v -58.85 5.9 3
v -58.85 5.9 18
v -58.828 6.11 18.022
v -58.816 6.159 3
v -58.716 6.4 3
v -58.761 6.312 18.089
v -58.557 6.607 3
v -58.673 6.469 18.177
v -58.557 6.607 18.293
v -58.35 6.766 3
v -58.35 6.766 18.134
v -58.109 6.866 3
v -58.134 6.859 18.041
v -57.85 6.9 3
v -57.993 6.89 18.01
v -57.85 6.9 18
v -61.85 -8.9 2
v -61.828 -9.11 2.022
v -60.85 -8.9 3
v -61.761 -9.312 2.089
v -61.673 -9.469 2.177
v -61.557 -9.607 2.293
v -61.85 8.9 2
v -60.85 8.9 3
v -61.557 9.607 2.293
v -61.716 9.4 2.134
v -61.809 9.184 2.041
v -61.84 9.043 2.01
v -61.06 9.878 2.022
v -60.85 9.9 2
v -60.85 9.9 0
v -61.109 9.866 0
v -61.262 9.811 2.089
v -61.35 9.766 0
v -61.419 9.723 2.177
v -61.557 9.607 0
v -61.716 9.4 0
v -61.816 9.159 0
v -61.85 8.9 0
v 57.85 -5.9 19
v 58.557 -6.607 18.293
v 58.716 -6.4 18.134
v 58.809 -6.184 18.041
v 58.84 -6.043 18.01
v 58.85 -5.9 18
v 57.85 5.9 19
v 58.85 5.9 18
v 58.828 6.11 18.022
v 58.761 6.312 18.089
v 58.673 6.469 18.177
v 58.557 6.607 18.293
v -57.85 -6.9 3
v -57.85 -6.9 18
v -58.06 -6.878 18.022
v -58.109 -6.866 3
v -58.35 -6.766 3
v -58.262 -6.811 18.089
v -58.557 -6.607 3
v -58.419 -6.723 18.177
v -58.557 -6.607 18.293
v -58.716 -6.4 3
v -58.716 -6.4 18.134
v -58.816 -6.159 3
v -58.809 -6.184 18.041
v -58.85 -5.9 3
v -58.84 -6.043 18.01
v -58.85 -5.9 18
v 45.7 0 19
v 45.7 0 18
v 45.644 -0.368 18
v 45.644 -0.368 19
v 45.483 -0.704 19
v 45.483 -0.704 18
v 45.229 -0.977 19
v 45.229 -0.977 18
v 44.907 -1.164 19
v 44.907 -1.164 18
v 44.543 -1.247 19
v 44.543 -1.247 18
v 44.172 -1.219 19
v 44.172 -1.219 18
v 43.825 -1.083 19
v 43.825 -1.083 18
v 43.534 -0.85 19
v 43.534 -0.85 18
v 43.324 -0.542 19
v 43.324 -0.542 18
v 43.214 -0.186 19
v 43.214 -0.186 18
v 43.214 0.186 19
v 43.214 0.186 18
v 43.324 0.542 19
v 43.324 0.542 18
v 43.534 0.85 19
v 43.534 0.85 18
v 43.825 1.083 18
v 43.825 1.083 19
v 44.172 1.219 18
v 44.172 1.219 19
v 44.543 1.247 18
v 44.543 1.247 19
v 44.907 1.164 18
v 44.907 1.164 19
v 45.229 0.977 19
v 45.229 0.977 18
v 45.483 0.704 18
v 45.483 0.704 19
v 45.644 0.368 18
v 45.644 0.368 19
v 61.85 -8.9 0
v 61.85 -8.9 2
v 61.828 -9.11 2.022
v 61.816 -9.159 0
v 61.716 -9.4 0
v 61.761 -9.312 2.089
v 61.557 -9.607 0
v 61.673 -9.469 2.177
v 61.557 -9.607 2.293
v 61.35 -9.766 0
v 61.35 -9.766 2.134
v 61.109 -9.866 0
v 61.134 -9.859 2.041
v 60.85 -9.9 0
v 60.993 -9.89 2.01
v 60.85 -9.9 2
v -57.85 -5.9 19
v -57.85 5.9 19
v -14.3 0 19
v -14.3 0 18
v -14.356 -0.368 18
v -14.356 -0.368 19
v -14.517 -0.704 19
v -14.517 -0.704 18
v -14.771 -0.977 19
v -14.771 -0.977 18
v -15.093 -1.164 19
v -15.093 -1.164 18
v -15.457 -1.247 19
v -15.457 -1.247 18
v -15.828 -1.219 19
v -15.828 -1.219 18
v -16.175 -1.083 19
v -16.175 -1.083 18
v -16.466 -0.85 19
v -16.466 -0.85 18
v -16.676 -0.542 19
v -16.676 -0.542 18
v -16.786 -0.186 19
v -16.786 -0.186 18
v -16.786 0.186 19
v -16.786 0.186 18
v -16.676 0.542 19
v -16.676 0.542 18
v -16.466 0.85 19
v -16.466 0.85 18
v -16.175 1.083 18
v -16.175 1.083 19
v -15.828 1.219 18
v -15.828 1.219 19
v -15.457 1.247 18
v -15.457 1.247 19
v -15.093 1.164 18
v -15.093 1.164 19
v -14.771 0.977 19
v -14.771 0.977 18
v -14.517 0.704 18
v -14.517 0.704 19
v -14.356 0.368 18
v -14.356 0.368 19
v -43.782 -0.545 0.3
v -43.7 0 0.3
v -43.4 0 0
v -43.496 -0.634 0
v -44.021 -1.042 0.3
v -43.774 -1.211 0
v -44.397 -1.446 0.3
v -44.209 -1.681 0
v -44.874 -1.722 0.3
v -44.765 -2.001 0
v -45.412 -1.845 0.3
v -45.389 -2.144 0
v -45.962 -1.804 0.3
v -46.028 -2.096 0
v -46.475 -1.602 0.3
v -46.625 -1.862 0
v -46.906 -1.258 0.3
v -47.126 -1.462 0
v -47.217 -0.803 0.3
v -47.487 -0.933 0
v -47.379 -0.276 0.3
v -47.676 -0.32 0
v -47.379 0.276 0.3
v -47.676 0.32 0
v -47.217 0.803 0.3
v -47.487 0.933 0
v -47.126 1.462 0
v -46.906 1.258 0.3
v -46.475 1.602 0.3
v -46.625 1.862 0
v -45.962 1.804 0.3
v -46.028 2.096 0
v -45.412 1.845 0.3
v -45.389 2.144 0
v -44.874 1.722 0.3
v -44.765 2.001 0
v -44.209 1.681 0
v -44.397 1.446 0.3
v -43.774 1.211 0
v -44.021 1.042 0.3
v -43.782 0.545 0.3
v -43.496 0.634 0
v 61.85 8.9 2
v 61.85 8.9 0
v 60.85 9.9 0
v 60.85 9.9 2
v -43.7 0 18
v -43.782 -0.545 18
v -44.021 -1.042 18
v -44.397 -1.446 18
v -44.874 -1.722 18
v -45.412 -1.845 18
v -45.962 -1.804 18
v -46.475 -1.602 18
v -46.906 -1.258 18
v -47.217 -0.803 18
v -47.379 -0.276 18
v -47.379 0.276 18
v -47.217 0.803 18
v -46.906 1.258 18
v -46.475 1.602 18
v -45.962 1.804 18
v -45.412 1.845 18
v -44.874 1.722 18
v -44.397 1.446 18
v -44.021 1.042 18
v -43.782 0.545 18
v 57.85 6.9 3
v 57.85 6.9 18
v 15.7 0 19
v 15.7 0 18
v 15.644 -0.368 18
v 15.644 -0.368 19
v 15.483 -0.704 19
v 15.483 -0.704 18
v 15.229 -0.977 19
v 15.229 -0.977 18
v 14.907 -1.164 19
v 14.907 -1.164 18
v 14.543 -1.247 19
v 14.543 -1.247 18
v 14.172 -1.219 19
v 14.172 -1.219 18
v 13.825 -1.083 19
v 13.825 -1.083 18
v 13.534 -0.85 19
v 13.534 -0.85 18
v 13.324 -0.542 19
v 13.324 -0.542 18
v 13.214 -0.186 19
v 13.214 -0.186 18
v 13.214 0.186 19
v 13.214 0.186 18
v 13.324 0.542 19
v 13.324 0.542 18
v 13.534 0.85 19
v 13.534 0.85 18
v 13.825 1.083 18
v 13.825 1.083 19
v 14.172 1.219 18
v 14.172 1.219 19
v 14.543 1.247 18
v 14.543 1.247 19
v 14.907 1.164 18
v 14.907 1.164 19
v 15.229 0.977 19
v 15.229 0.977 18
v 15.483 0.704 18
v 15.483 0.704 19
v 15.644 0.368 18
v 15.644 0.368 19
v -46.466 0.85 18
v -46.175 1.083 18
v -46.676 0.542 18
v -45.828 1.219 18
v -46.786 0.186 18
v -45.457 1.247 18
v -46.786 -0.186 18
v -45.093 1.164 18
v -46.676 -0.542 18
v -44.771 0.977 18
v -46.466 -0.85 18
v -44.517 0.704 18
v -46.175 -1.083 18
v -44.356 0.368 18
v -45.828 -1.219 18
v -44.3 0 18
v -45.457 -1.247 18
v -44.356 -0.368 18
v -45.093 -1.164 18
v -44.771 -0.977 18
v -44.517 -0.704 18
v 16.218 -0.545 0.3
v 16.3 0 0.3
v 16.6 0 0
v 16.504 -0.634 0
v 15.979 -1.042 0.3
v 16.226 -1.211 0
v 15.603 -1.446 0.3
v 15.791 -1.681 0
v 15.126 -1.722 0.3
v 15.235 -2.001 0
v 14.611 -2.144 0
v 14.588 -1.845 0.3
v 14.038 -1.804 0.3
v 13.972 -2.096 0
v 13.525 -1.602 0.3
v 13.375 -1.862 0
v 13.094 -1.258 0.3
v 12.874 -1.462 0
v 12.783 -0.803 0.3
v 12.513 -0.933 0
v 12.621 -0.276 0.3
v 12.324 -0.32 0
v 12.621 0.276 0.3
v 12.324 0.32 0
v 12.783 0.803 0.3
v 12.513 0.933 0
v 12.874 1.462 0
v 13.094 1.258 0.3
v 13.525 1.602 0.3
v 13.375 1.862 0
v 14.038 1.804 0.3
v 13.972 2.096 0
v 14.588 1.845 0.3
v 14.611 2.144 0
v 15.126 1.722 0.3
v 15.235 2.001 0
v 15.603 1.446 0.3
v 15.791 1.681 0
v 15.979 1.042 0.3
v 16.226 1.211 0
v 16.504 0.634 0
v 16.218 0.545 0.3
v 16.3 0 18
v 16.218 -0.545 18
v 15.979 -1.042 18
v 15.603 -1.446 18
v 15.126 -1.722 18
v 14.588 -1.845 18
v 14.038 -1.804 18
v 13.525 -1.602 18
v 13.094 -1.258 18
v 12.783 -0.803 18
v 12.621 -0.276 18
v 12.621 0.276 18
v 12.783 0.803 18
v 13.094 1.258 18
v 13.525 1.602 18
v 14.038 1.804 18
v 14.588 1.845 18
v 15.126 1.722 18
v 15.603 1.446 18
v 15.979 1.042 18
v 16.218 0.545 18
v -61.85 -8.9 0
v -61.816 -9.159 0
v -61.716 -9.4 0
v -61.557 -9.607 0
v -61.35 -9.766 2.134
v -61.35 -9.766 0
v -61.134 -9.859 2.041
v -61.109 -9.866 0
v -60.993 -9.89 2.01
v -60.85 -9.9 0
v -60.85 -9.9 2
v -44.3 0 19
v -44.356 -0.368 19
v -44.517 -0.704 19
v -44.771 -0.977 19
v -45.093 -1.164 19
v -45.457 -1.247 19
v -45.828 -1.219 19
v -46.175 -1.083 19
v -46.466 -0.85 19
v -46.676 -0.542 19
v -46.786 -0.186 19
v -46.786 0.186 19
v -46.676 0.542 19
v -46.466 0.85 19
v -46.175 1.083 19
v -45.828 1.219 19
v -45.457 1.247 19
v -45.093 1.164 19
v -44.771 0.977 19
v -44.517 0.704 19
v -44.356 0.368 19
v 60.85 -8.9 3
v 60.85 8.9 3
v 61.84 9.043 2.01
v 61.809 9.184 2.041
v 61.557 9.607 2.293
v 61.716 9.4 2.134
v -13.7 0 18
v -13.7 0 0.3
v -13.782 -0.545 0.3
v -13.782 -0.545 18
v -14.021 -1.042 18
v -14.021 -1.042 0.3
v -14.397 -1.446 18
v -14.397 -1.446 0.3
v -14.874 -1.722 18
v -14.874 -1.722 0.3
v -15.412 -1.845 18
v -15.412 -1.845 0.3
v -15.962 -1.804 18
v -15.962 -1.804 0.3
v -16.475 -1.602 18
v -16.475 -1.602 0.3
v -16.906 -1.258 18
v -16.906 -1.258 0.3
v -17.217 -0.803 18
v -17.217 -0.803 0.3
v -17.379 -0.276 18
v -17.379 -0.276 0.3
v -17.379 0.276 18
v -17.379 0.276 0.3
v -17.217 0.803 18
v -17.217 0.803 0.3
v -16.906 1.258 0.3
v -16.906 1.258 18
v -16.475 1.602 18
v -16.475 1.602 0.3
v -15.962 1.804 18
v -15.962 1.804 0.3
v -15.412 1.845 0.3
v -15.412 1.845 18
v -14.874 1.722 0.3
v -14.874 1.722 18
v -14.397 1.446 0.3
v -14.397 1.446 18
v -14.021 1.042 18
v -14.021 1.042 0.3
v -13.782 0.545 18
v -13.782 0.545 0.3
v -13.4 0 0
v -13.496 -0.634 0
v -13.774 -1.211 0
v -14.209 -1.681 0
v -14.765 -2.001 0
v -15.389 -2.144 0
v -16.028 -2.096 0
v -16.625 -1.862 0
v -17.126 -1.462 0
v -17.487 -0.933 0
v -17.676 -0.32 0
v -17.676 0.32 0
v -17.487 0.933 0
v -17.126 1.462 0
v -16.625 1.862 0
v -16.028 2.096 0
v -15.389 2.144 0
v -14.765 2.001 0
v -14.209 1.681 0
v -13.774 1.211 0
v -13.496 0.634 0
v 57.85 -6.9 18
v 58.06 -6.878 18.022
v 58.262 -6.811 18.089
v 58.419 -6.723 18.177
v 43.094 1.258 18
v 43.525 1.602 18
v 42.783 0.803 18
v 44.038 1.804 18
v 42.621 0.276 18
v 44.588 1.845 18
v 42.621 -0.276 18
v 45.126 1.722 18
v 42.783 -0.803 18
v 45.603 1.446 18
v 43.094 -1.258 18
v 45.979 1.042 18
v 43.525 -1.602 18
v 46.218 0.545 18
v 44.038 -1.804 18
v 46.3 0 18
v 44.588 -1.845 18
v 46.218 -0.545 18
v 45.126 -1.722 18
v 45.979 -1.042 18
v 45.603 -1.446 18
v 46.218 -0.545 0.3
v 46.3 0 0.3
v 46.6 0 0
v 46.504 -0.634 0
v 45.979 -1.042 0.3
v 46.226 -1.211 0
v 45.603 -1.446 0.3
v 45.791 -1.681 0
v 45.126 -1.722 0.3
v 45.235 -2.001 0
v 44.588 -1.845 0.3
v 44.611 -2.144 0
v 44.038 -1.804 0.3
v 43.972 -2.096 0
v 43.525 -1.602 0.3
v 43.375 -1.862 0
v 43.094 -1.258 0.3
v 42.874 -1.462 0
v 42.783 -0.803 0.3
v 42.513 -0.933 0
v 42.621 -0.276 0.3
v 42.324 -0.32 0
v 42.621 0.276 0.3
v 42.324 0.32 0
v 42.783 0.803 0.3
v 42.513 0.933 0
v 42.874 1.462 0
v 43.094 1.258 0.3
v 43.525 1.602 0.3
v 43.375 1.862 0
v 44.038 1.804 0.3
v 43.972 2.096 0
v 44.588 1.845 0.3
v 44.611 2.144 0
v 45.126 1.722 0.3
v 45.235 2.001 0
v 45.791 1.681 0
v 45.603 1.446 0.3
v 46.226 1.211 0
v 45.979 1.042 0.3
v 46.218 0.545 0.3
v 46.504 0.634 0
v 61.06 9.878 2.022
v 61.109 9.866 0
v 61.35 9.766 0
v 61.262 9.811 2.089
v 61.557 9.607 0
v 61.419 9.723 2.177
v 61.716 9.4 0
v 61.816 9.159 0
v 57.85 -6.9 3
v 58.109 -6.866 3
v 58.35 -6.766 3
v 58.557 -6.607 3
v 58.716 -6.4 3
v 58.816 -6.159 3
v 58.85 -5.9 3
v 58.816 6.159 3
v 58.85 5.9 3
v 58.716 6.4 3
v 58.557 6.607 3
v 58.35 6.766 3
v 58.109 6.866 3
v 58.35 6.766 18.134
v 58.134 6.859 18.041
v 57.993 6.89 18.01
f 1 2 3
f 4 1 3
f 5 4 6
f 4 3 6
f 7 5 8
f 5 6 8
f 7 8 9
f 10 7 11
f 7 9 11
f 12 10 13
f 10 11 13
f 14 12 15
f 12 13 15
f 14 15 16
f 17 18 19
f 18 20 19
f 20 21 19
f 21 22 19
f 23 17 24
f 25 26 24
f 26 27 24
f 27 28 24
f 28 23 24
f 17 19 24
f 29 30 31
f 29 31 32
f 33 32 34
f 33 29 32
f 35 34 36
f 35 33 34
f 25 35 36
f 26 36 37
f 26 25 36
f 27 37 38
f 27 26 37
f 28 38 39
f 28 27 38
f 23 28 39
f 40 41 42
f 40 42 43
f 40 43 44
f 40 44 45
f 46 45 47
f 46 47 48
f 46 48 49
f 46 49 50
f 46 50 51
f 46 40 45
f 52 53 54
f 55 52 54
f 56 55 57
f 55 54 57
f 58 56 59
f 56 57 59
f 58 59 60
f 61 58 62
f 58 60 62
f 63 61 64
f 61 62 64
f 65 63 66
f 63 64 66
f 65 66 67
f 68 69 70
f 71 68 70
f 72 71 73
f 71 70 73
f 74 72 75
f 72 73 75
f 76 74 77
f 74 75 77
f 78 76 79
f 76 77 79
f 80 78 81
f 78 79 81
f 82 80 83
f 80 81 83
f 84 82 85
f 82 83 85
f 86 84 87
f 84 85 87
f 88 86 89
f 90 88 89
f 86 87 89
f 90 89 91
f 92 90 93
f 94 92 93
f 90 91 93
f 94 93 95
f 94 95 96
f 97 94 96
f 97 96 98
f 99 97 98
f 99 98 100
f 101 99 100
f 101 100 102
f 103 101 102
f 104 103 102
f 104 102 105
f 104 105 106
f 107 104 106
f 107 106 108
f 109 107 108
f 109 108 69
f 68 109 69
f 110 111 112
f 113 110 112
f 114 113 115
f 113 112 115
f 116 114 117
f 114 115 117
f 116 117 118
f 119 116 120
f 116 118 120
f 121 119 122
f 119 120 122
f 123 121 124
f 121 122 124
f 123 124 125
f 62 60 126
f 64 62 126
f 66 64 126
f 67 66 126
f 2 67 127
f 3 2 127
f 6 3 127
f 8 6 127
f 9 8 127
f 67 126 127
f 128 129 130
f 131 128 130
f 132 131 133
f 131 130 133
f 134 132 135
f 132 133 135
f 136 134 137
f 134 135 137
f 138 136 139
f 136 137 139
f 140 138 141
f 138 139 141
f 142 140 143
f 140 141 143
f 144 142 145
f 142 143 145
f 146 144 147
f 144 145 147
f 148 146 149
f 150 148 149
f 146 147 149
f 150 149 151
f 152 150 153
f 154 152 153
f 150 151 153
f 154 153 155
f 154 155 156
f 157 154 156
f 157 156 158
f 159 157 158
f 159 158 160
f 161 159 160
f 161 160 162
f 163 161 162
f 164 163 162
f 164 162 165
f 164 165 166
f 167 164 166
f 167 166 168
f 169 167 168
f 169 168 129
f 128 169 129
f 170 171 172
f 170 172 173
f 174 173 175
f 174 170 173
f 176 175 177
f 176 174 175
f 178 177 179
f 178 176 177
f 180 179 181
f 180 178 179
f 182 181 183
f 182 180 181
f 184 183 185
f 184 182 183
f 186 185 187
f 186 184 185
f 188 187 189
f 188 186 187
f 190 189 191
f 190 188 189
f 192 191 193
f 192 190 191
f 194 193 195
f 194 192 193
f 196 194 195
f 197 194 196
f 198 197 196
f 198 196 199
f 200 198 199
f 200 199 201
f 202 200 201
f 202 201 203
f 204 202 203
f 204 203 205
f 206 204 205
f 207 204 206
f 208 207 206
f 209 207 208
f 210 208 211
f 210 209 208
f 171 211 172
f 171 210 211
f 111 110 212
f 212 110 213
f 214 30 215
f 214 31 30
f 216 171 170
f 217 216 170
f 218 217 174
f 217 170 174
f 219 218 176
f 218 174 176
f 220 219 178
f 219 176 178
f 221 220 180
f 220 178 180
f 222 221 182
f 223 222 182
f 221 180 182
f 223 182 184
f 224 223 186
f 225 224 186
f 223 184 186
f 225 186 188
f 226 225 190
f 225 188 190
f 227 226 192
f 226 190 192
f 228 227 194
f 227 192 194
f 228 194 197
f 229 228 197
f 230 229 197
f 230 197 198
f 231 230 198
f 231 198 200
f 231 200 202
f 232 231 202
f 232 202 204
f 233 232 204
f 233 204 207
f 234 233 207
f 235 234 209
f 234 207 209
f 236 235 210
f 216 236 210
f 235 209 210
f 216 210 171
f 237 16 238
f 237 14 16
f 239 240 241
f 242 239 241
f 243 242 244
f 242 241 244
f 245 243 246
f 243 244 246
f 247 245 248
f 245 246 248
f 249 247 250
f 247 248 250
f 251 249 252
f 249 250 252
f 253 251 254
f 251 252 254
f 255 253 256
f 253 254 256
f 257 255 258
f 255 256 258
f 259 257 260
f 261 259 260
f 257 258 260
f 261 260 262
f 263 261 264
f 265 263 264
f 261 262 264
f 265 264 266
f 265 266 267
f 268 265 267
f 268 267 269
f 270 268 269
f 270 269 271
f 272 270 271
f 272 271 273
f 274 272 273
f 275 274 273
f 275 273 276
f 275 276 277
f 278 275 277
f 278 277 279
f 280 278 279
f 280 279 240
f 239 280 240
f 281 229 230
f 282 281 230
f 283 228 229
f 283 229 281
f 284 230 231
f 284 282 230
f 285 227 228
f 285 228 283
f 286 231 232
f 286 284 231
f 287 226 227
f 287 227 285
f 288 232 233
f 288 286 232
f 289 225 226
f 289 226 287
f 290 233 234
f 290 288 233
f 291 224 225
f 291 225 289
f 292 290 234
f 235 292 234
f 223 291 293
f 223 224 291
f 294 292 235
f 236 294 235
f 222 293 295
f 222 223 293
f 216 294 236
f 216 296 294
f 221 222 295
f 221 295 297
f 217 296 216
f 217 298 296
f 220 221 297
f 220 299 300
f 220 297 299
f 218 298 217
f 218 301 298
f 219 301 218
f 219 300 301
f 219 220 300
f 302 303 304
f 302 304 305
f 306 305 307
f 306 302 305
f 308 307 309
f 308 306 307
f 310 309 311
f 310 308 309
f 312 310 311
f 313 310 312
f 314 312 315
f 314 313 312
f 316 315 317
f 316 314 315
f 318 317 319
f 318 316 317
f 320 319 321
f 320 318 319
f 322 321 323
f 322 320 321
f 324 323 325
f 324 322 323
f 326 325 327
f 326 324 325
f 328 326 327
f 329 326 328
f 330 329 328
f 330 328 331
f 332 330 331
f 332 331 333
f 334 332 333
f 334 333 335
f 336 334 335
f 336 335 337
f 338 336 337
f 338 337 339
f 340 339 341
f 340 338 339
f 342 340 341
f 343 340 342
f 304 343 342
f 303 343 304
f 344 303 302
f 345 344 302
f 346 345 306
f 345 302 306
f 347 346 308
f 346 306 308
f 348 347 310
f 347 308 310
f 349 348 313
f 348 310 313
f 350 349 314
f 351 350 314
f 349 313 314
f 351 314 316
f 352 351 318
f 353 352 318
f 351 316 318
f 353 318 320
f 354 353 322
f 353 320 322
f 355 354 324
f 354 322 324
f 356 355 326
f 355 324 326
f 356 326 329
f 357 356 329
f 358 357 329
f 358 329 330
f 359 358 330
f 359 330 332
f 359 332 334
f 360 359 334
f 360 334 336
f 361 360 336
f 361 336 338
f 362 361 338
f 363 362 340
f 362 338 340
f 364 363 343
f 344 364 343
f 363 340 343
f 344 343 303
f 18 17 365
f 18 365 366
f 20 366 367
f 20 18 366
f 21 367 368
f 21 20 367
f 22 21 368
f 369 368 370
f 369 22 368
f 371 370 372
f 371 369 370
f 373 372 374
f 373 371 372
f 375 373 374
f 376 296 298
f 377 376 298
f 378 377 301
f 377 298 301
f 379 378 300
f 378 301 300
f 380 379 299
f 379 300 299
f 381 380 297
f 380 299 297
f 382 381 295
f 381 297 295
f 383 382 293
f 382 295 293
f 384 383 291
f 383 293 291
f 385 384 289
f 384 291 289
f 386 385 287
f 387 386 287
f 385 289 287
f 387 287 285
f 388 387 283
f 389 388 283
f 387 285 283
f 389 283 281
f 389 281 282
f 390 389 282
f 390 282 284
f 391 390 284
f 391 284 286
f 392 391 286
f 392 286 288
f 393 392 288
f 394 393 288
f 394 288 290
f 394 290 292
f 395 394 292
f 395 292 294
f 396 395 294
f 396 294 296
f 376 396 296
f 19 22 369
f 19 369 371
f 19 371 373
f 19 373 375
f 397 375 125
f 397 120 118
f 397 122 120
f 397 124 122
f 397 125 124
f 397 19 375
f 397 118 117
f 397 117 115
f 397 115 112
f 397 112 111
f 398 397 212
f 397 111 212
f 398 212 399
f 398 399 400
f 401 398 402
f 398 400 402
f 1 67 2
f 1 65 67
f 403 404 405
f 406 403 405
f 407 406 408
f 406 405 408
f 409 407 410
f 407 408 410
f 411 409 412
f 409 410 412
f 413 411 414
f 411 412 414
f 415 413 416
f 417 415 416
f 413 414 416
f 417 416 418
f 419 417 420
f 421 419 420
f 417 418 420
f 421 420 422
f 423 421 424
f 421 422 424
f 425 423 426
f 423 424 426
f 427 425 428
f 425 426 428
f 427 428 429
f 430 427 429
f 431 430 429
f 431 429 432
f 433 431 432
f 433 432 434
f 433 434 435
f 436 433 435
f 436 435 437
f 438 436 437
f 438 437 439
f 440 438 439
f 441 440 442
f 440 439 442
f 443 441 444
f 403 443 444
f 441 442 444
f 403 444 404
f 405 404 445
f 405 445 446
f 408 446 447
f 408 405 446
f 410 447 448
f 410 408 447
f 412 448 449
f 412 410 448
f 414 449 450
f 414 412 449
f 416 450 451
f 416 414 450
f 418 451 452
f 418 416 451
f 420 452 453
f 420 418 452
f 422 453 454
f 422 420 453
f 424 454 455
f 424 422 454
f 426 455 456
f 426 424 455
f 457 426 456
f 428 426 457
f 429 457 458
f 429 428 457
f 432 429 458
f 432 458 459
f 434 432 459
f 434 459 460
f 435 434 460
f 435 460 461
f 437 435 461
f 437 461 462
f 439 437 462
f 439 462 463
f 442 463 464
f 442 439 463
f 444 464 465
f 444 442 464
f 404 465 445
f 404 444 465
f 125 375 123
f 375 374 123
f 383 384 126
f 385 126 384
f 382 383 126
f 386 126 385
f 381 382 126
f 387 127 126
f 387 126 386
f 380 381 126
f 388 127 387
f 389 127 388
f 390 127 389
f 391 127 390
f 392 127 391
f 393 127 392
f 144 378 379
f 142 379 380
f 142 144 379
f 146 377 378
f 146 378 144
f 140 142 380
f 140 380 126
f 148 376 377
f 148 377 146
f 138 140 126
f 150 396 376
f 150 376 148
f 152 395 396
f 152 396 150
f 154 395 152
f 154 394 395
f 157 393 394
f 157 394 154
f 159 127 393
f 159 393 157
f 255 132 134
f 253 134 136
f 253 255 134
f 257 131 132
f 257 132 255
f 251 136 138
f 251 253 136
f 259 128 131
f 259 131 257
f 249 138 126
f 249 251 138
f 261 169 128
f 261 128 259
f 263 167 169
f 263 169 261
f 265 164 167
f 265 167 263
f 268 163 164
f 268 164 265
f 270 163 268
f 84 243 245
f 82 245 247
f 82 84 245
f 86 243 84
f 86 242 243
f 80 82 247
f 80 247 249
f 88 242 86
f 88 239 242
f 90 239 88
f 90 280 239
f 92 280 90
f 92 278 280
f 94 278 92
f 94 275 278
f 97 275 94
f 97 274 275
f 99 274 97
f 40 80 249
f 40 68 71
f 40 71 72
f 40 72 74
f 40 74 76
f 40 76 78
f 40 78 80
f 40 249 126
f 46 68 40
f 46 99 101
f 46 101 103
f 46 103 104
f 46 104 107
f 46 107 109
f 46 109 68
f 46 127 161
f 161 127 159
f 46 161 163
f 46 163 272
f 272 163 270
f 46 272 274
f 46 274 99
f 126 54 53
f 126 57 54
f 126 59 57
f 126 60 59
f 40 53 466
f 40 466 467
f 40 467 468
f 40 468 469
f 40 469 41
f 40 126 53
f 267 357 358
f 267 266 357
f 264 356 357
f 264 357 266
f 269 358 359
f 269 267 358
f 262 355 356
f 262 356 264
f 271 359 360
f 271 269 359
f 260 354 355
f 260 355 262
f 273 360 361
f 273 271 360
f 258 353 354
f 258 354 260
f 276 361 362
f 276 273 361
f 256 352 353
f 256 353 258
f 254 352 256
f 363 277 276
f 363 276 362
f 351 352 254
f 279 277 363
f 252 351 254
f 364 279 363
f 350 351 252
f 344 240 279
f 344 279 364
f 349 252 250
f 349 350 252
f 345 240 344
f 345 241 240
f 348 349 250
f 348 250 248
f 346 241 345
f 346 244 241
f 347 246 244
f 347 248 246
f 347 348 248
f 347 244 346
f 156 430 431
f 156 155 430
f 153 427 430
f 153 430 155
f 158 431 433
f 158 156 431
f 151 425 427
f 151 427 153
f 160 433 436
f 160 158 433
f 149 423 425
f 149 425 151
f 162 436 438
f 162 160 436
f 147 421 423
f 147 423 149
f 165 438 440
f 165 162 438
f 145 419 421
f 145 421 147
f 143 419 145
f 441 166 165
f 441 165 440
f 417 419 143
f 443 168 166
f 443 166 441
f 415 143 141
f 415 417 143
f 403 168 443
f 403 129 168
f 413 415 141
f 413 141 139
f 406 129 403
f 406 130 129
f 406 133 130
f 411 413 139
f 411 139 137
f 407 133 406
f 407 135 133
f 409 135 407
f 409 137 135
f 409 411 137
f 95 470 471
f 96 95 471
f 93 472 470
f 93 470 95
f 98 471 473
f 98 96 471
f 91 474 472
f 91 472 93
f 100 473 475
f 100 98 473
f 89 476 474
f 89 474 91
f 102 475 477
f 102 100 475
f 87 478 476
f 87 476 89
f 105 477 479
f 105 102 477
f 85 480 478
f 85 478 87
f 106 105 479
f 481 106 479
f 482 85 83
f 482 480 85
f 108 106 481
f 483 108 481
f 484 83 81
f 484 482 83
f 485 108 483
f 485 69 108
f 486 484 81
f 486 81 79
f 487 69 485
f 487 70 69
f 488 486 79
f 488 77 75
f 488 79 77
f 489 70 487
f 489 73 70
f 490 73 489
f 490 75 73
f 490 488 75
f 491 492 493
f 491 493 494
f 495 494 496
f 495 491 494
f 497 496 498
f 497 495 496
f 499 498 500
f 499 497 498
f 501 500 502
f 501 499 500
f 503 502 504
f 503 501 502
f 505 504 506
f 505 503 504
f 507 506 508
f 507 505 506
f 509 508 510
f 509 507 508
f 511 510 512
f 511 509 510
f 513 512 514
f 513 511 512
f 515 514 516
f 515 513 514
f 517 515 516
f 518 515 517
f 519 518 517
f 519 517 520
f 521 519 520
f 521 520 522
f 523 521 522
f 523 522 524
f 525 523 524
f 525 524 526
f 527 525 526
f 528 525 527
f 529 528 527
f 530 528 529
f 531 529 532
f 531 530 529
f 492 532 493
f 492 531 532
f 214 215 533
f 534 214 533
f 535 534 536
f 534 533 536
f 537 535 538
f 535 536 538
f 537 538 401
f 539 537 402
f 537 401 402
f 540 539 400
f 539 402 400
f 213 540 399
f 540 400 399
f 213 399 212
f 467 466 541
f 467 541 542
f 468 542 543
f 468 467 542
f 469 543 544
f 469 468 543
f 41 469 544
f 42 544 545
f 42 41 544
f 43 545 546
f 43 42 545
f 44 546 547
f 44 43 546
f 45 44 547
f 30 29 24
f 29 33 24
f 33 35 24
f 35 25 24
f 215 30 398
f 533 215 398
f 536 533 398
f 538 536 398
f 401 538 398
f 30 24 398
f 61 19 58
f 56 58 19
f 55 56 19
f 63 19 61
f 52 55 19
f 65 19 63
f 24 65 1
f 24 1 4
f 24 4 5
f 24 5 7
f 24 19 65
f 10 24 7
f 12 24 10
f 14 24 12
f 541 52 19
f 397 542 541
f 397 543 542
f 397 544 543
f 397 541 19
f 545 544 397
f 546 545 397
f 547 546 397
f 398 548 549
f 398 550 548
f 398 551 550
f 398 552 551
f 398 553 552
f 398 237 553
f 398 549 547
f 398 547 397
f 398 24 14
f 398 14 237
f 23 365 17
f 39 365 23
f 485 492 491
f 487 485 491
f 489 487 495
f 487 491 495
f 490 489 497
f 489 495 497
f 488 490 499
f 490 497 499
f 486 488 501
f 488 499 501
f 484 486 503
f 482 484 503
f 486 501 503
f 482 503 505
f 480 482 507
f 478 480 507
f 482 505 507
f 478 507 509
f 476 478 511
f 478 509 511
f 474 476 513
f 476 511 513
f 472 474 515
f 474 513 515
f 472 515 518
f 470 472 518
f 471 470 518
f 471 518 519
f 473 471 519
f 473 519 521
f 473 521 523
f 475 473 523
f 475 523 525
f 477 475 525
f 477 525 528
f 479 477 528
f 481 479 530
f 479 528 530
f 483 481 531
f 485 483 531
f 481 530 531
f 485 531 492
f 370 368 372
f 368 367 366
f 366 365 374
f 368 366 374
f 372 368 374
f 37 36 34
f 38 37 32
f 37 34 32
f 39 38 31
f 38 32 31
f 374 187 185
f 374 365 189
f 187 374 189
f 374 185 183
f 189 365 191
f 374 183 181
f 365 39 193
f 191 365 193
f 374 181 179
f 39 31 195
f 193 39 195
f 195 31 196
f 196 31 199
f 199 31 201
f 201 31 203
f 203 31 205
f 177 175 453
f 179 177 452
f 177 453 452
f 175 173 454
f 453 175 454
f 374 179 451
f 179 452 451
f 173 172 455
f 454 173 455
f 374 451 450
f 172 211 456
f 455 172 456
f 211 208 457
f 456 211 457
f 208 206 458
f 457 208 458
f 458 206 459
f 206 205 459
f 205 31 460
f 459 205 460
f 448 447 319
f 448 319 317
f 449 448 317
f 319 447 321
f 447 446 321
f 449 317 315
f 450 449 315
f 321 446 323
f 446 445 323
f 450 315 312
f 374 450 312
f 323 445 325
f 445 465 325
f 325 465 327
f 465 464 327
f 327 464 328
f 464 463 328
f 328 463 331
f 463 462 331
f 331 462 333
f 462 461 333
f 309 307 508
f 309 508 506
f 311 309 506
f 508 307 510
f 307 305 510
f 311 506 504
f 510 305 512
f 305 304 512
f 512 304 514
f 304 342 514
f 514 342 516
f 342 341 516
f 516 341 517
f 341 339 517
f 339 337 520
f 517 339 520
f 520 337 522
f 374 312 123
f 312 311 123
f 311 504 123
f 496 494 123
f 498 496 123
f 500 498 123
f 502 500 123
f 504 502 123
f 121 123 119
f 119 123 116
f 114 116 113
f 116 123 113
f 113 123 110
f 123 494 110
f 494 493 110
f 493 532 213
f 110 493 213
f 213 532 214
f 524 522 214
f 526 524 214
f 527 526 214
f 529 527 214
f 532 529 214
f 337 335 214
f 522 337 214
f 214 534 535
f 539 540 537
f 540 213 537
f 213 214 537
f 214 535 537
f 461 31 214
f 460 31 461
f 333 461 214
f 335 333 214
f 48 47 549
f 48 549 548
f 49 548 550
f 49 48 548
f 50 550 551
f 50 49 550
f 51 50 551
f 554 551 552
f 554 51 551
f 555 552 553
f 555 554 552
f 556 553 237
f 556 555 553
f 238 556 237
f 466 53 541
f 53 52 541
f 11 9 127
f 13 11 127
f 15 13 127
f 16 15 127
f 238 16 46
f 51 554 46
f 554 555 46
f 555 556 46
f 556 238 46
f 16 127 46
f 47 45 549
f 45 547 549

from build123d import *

# Parameters (mm, degrees)
SKETCH_W        = 123.7
SKETCH_H        = 19.8
PAD_DEPTH       = 3
SKETCH001_W     = 117.7
SKETCH001_H     = 13.8
PAD001_DEPTH    = 16
SKETCH002_R     = 1.85
POCKET_DEPTH    = 18
CHAMFER_SIZE    = 1
SKETCH003_R     = 1.25
POCKET001_DEPTH = 5
CHAMFER001_SIZE = 1
FILLET_R        = 1
CHAMFER002_SIZE = 0.3


with BuildPart() as part:
    # Sketch → Pad (new body)
    with BuildSketch(Plane.XY):
        Rectangle(SKETCH_W, SKETCH_H)
    extrude(amount=PAD_DEPTH)

    # Sketch001 (on Face6 of Pad) → Pad001 (join)
    with BuildSketch(Plane.XY.offset(3)):
        Rectangle(SKETCH001_W, SKETCH001_H)
    extrude(amount=PAD001_DEPTH)

    # Sketch002 (on Face4 of Pad001) → Pocket (cut)
    with BuildSketch(Plane(origin=(0, 0, 0), x_dir=(1, 0, 0), z_dir=(0, 0, -1))):
        with Locations((-45.55, 0)):
            Circle(SKETCH002_R)
        with Locations((-15.55, 0)):
            Circle(SKETCH002_R)
        with Locations((14.45, 0)):
            Circle(SKETCH002_R)
        with Locations((44.45, 0)):
            Circle(SKETCH002_R)
    extrude(amount=-POCKET_DEPTH, mode=Mode.SUBTRACT)

    # Chamfer
    chamfer_edges = [part.edges().sort_by_distance(p)[0] for p in [
        (0, 9.9, 3),
        (-61.85, 0, 3),
        (61.85, 0, 3),
        (0, -9.9, 3),
    ]]
    chamfer(chamfer_edges, length=CHAMFER_SIZE)

    # Sketch003 → Pocket001 (cut)
    with BuildSketch(Plane(origin=(0, 0, 18), x_dir=(1, 0, 0), z_dir=(0, 0, -1))):
        with Locations((-45.55, 0)):
            Circle(SKETCH003_R)
        with Locations((-15.55, 0)):
            Circle(SKETCH003_R)
        with Locations((14.45, 0)):
            Circle(SKETCH003_R)
        with Locations((44.45, 0)):
            Circle(SKETCH003_R)
    extrude(amount=-POCKET001_DEPTH, mode=Mode.SUBTRACT)

    # Chamfer001
    chamfer001_edges = [part.edges().sort_by_distance(p)[0] for p in [
        (0, -6.9, 19),
        (0, 6.9, 19),
        (-58.85, 0, 19),
        (58.85, 0, 19),
    ]]
    chamfer(chamfer001_edges, length=CHAMFER001_SIZE)

    # Fillet
    fillet_edges = [part.edges().sort_by_distance(p)[0] for p in [
        (58.85, -6.9, 10.5),
        (58.85, 6.9, 10.5),
        (61.85, 9.9, 1),
        (61.85, -9.9, 1),
        (-58.85, -6.9, 10.5),
        (-58.85, 6.9, 10.5),
        (-61.85, 9.9, 1),
        (-61.85, -9.9, 1),
    ]]
    fillet(fillet_edges, radius=FILLET_R)

    # Chamfer002
    chamfer002_edges = [part.edges().sort_by_distance(p)[0] for p in [
        (-47.4, 0, 0),
        (-17.4, 0, 0),
        (12.6, 0, 0),
        (42.6, 0, 0),
    ]]
    chamfer(chamfer002_edges, length=CHAMFER002_SIZE)


solid = part.part
